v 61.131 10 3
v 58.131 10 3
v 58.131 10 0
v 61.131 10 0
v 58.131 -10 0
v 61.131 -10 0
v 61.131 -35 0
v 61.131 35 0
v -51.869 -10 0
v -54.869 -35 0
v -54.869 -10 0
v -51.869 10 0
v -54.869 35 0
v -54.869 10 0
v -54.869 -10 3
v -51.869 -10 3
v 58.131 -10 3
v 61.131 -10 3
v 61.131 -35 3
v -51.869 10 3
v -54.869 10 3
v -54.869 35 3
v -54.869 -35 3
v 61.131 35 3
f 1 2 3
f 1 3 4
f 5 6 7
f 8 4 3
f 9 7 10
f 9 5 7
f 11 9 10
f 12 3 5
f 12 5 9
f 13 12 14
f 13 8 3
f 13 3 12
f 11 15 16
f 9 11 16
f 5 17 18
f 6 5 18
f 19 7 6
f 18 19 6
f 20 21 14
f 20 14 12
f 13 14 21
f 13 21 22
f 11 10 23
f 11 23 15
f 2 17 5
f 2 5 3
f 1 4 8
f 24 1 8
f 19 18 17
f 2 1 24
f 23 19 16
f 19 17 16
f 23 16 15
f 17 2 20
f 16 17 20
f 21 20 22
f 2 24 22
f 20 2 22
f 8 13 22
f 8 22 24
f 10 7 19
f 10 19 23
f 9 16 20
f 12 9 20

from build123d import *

# Parameters (mm, degrees)
BOSS_EXTRUDE1_DEPTH = 3
SKETCH3_W           = 3
SKETCH3_H           = 20
CUT_EXTRUDE1_DEPTH  = 10


with BuildPart() as part:
    # Sketch2 → Boss-Extrude1 (new body)
    with BuildSketch(Plane.XY):
        Polygon((61.131293058, 0), (61.131293058, -35), (-54.868706942, -35), (-54.868706942, 35), (61.131293058, 35), align=None)
    extrude(amount=BOSS_EXTRUDE1_DEPTH)

    # Sketch3 → Cut-Extrude1 (cut)
    with BuildSketch(Plane.XY.offset(3)):
        with Locations((59.631293058, 0)):
            Rectangle(SKETCH3_W, SKETCH3_H)
        with Locations((-53.368706942, 0)):
            Rectangle(SKETCH3_W, SKETCH3_H)
    extrude(amount=-CUT_EXTRUDE1_DEPTH, mode=Mode.SUBTRACT)


solid = part.part
